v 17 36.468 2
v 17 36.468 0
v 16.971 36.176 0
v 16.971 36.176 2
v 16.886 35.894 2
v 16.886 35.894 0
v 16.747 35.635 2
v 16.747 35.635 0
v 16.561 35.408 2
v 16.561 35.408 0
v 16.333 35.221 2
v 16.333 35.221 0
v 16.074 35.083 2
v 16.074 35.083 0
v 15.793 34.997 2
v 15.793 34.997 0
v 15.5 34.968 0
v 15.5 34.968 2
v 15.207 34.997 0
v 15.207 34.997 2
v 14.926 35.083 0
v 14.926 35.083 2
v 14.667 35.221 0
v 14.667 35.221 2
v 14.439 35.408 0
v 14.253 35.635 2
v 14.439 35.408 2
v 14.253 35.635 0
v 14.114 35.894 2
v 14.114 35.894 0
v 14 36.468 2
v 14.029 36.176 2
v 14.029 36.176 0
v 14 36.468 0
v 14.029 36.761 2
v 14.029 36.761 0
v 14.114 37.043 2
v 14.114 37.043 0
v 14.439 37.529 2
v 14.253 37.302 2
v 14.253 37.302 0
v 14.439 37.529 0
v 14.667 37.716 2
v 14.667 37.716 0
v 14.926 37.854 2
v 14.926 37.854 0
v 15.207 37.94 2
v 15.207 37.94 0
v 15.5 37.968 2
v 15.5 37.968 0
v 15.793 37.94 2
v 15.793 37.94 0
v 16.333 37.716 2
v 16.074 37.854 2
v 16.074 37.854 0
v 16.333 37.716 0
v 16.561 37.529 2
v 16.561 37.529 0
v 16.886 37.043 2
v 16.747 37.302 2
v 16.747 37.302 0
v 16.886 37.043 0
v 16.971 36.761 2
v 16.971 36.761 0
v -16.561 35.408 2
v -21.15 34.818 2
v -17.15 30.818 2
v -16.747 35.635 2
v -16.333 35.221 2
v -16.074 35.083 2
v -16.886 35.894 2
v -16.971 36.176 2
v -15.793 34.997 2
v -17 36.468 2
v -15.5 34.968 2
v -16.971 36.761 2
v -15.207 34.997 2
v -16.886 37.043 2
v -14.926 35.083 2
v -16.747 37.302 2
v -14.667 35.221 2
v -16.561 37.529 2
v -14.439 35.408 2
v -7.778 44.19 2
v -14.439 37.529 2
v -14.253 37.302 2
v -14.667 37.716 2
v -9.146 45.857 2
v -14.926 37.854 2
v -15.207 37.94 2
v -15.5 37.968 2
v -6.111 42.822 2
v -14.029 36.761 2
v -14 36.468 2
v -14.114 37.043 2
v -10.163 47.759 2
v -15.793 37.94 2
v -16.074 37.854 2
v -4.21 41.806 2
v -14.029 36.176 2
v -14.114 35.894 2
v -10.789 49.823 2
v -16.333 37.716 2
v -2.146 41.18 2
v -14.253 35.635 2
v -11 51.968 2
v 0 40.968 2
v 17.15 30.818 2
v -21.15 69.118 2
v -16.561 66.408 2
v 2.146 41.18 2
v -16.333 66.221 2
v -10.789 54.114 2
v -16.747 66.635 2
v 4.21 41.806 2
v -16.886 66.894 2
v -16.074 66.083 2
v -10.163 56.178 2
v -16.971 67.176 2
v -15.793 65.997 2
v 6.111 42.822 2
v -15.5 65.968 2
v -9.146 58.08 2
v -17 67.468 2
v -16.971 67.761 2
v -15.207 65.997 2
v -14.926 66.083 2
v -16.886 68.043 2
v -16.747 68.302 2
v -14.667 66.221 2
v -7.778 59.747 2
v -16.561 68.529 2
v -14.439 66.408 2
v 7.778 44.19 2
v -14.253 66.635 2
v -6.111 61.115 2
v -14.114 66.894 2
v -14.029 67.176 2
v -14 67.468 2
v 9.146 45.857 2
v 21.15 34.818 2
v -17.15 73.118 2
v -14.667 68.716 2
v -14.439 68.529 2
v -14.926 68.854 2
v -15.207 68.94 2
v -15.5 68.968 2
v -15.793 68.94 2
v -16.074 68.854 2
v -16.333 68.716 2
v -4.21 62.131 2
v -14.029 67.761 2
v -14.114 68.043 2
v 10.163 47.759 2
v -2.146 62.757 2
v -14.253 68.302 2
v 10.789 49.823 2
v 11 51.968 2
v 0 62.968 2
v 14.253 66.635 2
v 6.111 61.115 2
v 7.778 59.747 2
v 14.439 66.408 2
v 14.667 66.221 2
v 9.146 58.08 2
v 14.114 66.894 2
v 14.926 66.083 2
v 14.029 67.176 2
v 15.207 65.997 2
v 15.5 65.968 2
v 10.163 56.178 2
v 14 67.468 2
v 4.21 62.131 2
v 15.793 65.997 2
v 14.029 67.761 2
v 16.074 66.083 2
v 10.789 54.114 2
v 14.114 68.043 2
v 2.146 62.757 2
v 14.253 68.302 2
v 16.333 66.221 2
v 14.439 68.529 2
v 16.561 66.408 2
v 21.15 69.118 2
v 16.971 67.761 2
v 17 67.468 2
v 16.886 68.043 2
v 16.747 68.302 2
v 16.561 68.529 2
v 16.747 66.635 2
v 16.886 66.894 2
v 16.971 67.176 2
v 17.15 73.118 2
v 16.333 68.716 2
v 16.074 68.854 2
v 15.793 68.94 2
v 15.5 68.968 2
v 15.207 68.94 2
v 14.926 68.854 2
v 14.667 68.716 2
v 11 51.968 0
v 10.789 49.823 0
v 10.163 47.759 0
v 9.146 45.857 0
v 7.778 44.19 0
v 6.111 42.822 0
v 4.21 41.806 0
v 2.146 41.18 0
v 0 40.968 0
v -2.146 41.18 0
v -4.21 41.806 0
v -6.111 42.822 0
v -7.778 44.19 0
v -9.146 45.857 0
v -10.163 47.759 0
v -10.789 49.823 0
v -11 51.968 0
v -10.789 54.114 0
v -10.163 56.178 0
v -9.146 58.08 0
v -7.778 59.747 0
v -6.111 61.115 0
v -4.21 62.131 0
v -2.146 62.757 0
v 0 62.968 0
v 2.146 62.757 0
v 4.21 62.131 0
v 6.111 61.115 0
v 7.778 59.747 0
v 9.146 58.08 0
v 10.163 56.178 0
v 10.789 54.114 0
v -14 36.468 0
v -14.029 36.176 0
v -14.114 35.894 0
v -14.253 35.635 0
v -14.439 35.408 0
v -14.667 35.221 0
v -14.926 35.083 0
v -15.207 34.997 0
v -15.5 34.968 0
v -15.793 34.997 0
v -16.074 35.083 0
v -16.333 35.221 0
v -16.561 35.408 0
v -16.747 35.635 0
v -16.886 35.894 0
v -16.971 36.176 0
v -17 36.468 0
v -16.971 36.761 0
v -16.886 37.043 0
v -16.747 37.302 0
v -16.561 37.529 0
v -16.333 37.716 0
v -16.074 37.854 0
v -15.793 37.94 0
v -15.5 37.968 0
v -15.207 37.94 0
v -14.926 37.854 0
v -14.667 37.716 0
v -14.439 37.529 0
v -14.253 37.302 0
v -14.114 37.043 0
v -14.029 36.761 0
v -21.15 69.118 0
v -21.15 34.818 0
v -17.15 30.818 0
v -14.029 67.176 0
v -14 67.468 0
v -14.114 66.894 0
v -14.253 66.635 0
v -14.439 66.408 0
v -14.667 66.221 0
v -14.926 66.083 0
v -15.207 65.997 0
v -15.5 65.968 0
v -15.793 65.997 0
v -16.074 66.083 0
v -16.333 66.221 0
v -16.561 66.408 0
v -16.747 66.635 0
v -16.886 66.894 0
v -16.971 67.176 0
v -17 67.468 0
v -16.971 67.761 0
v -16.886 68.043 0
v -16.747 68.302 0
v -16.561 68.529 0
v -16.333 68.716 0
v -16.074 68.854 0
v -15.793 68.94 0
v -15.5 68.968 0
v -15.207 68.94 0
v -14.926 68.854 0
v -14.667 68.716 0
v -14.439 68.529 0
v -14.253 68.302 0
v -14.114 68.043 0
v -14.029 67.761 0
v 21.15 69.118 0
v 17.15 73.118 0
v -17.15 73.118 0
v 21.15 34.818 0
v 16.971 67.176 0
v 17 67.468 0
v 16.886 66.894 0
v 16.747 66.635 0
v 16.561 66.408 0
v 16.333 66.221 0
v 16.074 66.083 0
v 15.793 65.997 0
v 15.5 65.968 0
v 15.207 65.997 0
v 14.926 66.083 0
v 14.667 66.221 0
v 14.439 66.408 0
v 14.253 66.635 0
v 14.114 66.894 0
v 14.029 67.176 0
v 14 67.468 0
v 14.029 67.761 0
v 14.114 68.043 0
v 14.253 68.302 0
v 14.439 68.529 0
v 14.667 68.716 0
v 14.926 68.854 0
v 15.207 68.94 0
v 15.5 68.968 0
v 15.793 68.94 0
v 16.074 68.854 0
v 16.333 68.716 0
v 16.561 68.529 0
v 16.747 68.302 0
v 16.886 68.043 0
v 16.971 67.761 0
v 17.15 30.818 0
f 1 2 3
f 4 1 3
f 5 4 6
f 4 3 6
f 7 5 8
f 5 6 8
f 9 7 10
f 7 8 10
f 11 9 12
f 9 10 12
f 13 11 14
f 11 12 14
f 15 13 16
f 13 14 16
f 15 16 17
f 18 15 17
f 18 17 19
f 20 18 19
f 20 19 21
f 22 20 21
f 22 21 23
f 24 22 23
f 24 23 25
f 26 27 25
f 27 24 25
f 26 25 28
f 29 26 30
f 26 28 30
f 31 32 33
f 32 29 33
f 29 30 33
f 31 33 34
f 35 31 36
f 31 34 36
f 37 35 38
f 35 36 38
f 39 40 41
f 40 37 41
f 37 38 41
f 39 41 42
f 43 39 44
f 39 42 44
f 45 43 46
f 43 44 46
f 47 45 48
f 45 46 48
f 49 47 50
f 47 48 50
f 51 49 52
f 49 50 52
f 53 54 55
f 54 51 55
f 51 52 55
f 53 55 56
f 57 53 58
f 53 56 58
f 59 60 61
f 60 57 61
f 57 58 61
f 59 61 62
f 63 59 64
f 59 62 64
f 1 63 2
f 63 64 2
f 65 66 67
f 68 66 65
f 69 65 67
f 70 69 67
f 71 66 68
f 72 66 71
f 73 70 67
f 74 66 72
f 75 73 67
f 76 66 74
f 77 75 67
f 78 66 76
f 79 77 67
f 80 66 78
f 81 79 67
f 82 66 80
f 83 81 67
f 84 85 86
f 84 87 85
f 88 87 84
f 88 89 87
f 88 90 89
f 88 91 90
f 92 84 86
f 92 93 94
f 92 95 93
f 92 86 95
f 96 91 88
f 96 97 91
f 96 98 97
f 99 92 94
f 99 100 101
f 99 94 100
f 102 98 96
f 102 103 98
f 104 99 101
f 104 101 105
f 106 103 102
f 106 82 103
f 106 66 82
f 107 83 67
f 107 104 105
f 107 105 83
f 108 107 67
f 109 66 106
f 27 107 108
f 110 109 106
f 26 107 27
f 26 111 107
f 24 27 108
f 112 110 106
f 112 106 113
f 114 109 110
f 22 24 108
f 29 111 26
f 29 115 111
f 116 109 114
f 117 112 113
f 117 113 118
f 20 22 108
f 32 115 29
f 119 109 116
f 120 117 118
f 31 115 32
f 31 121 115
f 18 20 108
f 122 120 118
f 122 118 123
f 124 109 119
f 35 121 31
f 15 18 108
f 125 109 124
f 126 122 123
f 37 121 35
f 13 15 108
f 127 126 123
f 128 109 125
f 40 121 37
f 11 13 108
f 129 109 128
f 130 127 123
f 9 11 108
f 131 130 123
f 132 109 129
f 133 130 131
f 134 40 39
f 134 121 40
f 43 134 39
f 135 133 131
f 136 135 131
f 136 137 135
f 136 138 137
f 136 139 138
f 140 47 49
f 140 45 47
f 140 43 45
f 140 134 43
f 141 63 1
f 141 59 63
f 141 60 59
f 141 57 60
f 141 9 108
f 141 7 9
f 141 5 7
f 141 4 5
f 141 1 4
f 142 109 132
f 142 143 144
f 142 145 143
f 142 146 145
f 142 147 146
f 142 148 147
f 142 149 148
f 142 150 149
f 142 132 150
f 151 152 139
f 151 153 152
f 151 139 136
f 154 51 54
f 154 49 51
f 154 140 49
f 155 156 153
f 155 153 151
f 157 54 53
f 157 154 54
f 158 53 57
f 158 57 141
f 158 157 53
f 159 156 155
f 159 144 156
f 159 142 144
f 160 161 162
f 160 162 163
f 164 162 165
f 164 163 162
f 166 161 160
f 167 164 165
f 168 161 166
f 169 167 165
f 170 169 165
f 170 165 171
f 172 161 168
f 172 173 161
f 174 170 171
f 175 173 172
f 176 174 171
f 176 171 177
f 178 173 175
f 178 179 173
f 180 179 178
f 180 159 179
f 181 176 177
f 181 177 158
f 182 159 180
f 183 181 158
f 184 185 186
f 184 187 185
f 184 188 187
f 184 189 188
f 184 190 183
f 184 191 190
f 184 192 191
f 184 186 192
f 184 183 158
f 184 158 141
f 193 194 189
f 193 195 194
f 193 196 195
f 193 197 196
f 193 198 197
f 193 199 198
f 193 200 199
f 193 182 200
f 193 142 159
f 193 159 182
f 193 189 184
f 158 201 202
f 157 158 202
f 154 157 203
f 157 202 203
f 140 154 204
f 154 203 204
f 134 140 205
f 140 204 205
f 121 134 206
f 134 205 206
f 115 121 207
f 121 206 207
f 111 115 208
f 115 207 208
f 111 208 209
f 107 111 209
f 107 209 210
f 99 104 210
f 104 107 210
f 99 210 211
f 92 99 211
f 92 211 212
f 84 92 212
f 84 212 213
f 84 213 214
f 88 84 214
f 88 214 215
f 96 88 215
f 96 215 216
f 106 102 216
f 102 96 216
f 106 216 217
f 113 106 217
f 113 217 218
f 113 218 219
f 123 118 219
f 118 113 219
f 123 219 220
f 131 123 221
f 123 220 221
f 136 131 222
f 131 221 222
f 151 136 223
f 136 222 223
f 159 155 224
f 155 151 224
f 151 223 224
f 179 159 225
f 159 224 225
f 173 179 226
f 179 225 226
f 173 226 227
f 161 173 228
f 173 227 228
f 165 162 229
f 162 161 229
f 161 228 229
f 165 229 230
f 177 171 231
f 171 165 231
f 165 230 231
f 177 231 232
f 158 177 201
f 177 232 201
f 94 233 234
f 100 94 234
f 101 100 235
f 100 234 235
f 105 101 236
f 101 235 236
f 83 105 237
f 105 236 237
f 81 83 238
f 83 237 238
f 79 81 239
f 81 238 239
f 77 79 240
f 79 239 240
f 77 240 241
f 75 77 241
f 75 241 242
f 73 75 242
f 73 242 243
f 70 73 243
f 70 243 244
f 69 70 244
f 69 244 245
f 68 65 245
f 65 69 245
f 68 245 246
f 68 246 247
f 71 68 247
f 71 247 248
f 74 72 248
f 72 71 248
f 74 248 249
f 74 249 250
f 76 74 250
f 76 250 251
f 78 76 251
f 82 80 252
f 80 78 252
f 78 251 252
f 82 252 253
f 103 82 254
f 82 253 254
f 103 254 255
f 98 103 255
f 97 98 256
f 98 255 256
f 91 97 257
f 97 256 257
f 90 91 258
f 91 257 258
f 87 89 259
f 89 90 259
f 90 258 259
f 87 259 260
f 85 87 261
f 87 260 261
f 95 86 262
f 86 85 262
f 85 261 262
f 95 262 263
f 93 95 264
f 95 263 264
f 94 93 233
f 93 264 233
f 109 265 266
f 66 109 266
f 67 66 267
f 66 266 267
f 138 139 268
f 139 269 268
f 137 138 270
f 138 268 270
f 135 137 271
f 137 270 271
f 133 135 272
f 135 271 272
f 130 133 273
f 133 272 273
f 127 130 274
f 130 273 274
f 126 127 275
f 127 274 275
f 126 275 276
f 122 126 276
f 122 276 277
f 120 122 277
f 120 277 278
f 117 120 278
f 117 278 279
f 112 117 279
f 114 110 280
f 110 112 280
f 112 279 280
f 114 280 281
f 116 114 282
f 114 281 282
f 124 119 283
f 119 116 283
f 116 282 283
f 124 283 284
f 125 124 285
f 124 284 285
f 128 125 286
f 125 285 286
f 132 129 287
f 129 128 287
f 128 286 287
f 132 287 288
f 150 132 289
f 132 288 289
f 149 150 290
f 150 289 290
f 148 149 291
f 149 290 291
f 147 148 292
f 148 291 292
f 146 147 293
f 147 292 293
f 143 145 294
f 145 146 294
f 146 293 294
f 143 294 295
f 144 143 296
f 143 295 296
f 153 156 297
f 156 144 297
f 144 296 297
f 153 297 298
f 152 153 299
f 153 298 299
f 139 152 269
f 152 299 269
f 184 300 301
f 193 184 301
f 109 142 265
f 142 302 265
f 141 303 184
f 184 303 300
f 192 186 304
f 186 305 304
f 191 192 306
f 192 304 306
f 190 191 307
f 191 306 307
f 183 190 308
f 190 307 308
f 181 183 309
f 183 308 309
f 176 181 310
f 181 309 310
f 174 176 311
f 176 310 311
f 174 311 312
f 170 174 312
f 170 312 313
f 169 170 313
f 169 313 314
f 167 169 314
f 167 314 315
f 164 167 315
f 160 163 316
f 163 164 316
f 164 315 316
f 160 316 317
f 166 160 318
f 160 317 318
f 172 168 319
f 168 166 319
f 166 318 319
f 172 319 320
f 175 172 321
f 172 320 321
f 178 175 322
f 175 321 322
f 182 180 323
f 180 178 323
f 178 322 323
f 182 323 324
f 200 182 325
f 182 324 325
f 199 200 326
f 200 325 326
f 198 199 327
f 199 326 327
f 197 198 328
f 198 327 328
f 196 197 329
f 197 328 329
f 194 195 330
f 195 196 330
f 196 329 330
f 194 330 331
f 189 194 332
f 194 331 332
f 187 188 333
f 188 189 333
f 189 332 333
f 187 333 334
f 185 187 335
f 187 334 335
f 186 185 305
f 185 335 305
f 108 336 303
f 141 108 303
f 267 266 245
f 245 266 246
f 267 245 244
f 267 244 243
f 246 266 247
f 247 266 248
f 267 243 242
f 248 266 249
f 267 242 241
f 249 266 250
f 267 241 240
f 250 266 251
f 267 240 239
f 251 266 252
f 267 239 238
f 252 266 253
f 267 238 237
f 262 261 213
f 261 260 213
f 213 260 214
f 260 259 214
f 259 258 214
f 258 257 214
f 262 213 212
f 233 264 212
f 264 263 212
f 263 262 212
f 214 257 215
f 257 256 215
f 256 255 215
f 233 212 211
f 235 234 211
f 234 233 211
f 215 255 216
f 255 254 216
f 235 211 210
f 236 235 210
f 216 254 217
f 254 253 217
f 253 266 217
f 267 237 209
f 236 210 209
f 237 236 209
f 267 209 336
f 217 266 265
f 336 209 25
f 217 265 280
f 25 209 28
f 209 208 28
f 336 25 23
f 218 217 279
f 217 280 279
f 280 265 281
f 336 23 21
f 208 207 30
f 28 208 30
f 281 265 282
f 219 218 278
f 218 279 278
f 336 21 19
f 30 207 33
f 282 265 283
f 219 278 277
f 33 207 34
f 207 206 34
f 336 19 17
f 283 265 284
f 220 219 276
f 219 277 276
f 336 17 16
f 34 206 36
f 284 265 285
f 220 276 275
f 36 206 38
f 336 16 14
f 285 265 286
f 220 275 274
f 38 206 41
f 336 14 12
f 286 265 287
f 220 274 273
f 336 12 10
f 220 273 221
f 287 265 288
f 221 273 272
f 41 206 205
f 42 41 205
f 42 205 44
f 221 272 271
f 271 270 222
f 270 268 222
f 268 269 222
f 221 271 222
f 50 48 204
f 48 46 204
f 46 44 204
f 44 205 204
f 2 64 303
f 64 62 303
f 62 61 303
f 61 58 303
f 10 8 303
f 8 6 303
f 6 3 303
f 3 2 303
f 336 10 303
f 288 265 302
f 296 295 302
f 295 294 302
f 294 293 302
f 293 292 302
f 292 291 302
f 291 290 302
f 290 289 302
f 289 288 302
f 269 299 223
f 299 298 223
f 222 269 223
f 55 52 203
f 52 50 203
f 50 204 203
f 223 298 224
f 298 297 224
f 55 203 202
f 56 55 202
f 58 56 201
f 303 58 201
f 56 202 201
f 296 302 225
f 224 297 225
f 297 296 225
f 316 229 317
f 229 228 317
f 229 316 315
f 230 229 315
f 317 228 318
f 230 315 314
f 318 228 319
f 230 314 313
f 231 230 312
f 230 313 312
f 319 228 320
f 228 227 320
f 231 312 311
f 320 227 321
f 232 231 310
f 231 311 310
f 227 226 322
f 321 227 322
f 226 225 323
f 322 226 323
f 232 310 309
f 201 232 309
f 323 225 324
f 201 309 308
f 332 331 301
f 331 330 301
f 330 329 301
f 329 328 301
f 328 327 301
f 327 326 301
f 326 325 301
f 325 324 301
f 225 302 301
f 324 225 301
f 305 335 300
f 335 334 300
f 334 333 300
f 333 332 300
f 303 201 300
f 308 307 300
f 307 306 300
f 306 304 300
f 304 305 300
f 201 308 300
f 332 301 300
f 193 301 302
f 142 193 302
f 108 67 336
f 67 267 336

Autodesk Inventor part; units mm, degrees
ref_plane "YZ Plane" through (0, 0, 0) normal (1, 0, 0) x (0, 1, 0)
ref_plane "XZ Plane" through (0, 0, 0) normal (0, 1, 0) x (-1, 0, 0)
ref_plane "XY Plane" through (0, 0, 0) normal (0, 0, 1) x (1, 0, 0)
sketch "Sketch1" plane through (0, 0, 0) normal (0, 0, 1) x (1, 0, 0)
  circle A0 centre (0, 51.9685) radius 11 projected
  line L0 (21.15, 34.8185) -> (21.15, 69.1185) projected
  line L1 (21.15, 69.1185) -> (17.15, 73.1185) projected
  line L2 (17.15, 73.1185) -> (-17.15, 73.1185) projected
  line L3 (-17.15, 73.1185) -> (-21.15, 69.1185) projected
  line L4 (-21.15, 69.1185) -> (-21.15, 34.8185) projected
  line L5 (-21.15, 34.8185) -> (-17.15, 30.8185) projected
  line L6 (-17.15, 30.8185) -> (17.15, 30.8185) projected
  line L7 (17.15, 30.8185) -> (21.15, 34.8185) projected
  circle A1 centre (-15.5, 36.4685) radius 1.5 projected
  circle A2 centre (15.5, 36.4685) radius 1.5 projected
  circle A3 centre (15.5, 67.4685) radius 1.5 projected
  circle A4 centre (-15.5, 67.4685) radius 1.5 projected
  point P0 (0, 0)
extrude "Extrusion1" add sketch "Sketch1" along normal blind 2
properties part number "Stepper_spacer"
